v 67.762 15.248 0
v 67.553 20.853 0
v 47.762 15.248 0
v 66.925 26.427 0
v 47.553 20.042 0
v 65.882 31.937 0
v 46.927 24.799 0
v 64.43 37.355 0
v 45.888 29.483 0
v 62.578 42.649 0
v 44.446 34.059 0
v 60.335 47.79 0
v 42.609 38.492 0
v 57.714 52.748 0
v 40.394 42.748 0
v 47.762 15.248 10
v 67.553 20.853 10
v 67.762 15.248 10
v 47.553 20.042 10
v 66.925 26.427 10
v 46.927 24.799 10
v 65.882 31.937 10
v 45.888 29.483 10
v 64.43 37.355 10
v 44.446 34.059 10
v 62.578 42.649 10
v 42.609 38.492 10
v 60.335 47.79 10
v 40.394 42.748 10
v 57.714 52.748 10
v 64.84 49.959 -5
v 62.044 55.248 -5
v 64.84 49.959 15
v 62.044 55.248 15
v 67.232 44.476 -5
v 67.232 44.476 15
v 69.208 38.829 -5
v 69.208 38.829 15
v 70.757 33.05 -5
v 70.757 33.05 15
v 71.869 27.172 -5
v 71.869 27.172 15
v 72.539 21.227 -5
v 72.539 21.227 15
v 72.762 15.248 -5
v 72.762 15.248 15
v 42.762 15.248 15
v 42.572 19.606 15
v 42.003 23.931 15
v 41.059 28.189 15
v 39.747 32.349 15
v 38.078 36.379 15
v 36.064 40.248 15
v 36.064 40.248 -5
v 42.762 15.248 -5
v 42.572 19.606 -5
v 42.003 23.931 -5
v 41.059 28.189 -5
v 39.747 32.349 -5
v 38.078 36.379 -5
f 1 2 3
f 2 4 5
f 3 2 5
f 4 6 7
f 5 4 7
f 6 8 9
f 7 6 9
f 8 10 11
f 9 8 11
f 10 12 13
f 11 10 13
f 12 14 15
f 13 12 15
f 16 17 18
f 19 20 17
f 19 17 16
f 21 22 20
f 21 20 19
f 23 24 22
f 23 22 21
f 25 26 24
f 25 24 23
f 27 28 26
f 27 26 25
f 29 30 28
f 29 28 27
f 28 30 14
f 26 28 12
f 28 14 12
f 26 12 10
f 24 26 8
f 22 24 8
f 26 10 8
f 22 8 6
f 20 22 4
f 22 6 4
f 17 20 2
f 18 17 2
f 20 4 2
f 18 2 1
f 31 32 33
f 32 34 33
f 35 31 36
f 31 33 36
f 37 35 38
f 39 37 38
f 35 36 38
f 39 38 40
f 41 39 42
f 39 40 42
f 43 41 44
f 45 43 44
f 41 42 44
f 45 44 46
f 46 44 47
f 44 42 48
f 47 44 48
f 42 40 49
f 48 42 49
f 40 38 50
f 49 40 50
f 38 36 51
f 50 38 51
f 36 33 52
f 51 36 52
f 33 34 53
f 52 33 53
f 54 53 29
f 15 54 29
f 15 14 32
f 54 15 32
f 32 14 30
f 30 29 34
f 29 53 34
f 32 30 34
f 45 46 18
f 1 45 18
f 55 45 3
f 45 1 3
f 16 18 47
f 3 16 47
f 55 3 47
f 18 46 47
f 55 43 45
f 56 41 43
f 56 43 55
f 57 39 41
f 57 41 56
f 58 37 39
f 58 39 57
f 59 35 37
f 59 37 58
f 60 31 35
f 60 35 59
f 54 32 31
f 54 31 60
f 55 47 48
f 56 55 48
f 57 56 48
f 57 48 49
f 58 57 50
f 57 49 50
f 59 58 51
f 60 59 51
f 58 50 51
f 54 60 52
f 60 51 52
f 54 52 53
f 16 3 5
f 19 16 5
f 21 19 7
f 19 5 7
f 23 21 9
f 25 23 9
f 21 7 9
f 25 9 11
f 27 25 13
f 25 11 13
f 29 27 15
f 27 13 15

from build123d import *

# Parameters (mm, degrees)
BOSS_EXTRUDE1_DEPTH   = 10
BOSS_EXTRUDE1_2_DEPTH = 10
BOSS_EXTRUDE2_DEPTH   = 5
BOSS_EXTRUDE3_DEPTH   = 5


with BuildPart() as part:
    # Sketch1 → Boss-Extrude1 (new body)
    with BuildSketch(Plane.XY):
        with BuildLine():
            ThreePointArc((36.063682392, 40.248355648), (41.058703517, 28.189307903), (42.762412203, 15.248355648))
            Line((42.762412203, 15.248355648), (47.762412203, 15.248355648))
            ThreePointArc((47.762412203, 15.248355648), (45.888332649, 29.483403128), (40.393809411, 42.748355648))
            Line((40.393809411, 42.748355648), (36.063682392, 40.248355648))
        make_face()
    extrude(amount=BOSS_EXTRUDE1_DEPTH)



with BuildPart() as body_2:
    # Sketch1 → Boss-Extrude1 2 (new body)
    with BuildSketch(Plane.XY):
        with BuildLine():
            ThreePointArc((57.714317487, 52.748355648), (65.206849175, 34.65978403), (67.762412203, 15.248355648))
            Line((67.762412203, 15.248355648), (72.762412203, 15.248355648))
            ThreePointArc((72.762412203, 15.248355648), (70.036478306, 35.953879256), (62.044444506, 55.248355648))
            Line((62.044444506, 55.248355648), (57.714317487, 52.748355648))
        make_face()
    extrude(amount=BOSS_EXTRUDE1_2_DEPTH)


with BuildPart() as part_1:
    add(part.part)

    add(body_2.part)  # Boss-Extrude2 merges body 2
    # Sketch2 → Boss-Extrude2 (add)
    with BuildSketch(Plane.XY.offset(10)):
        with BuildLine():
            Line((36.063682392, 40.248355648), (62.044444506, 55.248355648))
            ThreePointArc((62.044444506, 55.248355648), (70.036478306, 35.953879256), (72.762412203, 15.248355648))
            Line((72.762412203, 15.248355648), (42.762412203, 15.248355648))
            ThreePointArc((42.762412203, 15.248355648), (41.058703517, 28.189307903), (36.063682392, 40.248355648))
        make_face()
    extrude(amount=BOSS_EXTRUDE2_DEPTH)

    # Sketch3 → Boss-Extrude3 (add)
    with BuildSketch(Plane(origin=(0, 0, 0), x_dir=(-1, 0, 0), z_dir=(0, 0, -1))):
        with BuildLine():
            Line((-36.063682392, 40.248355648), (-62.044444506, 55.248355648))
            ThreePointArc((-62.044444506, 55.248355648), (-70.036478306, 35.953879256), (-72.762412203, 15.248355648))
            Line((-72.762412203, 15.248355648), (-42.762412203, 15.248355648))
            ThreePointArc((-42.762412203, 15.248355648), (-41.058703517, 28.189307903), (-36.063682392, 40.248355648))
        make_face()
    extrude(amount=BOSS_EXTRUDE3_DEPTH)


solid = part_1.part
